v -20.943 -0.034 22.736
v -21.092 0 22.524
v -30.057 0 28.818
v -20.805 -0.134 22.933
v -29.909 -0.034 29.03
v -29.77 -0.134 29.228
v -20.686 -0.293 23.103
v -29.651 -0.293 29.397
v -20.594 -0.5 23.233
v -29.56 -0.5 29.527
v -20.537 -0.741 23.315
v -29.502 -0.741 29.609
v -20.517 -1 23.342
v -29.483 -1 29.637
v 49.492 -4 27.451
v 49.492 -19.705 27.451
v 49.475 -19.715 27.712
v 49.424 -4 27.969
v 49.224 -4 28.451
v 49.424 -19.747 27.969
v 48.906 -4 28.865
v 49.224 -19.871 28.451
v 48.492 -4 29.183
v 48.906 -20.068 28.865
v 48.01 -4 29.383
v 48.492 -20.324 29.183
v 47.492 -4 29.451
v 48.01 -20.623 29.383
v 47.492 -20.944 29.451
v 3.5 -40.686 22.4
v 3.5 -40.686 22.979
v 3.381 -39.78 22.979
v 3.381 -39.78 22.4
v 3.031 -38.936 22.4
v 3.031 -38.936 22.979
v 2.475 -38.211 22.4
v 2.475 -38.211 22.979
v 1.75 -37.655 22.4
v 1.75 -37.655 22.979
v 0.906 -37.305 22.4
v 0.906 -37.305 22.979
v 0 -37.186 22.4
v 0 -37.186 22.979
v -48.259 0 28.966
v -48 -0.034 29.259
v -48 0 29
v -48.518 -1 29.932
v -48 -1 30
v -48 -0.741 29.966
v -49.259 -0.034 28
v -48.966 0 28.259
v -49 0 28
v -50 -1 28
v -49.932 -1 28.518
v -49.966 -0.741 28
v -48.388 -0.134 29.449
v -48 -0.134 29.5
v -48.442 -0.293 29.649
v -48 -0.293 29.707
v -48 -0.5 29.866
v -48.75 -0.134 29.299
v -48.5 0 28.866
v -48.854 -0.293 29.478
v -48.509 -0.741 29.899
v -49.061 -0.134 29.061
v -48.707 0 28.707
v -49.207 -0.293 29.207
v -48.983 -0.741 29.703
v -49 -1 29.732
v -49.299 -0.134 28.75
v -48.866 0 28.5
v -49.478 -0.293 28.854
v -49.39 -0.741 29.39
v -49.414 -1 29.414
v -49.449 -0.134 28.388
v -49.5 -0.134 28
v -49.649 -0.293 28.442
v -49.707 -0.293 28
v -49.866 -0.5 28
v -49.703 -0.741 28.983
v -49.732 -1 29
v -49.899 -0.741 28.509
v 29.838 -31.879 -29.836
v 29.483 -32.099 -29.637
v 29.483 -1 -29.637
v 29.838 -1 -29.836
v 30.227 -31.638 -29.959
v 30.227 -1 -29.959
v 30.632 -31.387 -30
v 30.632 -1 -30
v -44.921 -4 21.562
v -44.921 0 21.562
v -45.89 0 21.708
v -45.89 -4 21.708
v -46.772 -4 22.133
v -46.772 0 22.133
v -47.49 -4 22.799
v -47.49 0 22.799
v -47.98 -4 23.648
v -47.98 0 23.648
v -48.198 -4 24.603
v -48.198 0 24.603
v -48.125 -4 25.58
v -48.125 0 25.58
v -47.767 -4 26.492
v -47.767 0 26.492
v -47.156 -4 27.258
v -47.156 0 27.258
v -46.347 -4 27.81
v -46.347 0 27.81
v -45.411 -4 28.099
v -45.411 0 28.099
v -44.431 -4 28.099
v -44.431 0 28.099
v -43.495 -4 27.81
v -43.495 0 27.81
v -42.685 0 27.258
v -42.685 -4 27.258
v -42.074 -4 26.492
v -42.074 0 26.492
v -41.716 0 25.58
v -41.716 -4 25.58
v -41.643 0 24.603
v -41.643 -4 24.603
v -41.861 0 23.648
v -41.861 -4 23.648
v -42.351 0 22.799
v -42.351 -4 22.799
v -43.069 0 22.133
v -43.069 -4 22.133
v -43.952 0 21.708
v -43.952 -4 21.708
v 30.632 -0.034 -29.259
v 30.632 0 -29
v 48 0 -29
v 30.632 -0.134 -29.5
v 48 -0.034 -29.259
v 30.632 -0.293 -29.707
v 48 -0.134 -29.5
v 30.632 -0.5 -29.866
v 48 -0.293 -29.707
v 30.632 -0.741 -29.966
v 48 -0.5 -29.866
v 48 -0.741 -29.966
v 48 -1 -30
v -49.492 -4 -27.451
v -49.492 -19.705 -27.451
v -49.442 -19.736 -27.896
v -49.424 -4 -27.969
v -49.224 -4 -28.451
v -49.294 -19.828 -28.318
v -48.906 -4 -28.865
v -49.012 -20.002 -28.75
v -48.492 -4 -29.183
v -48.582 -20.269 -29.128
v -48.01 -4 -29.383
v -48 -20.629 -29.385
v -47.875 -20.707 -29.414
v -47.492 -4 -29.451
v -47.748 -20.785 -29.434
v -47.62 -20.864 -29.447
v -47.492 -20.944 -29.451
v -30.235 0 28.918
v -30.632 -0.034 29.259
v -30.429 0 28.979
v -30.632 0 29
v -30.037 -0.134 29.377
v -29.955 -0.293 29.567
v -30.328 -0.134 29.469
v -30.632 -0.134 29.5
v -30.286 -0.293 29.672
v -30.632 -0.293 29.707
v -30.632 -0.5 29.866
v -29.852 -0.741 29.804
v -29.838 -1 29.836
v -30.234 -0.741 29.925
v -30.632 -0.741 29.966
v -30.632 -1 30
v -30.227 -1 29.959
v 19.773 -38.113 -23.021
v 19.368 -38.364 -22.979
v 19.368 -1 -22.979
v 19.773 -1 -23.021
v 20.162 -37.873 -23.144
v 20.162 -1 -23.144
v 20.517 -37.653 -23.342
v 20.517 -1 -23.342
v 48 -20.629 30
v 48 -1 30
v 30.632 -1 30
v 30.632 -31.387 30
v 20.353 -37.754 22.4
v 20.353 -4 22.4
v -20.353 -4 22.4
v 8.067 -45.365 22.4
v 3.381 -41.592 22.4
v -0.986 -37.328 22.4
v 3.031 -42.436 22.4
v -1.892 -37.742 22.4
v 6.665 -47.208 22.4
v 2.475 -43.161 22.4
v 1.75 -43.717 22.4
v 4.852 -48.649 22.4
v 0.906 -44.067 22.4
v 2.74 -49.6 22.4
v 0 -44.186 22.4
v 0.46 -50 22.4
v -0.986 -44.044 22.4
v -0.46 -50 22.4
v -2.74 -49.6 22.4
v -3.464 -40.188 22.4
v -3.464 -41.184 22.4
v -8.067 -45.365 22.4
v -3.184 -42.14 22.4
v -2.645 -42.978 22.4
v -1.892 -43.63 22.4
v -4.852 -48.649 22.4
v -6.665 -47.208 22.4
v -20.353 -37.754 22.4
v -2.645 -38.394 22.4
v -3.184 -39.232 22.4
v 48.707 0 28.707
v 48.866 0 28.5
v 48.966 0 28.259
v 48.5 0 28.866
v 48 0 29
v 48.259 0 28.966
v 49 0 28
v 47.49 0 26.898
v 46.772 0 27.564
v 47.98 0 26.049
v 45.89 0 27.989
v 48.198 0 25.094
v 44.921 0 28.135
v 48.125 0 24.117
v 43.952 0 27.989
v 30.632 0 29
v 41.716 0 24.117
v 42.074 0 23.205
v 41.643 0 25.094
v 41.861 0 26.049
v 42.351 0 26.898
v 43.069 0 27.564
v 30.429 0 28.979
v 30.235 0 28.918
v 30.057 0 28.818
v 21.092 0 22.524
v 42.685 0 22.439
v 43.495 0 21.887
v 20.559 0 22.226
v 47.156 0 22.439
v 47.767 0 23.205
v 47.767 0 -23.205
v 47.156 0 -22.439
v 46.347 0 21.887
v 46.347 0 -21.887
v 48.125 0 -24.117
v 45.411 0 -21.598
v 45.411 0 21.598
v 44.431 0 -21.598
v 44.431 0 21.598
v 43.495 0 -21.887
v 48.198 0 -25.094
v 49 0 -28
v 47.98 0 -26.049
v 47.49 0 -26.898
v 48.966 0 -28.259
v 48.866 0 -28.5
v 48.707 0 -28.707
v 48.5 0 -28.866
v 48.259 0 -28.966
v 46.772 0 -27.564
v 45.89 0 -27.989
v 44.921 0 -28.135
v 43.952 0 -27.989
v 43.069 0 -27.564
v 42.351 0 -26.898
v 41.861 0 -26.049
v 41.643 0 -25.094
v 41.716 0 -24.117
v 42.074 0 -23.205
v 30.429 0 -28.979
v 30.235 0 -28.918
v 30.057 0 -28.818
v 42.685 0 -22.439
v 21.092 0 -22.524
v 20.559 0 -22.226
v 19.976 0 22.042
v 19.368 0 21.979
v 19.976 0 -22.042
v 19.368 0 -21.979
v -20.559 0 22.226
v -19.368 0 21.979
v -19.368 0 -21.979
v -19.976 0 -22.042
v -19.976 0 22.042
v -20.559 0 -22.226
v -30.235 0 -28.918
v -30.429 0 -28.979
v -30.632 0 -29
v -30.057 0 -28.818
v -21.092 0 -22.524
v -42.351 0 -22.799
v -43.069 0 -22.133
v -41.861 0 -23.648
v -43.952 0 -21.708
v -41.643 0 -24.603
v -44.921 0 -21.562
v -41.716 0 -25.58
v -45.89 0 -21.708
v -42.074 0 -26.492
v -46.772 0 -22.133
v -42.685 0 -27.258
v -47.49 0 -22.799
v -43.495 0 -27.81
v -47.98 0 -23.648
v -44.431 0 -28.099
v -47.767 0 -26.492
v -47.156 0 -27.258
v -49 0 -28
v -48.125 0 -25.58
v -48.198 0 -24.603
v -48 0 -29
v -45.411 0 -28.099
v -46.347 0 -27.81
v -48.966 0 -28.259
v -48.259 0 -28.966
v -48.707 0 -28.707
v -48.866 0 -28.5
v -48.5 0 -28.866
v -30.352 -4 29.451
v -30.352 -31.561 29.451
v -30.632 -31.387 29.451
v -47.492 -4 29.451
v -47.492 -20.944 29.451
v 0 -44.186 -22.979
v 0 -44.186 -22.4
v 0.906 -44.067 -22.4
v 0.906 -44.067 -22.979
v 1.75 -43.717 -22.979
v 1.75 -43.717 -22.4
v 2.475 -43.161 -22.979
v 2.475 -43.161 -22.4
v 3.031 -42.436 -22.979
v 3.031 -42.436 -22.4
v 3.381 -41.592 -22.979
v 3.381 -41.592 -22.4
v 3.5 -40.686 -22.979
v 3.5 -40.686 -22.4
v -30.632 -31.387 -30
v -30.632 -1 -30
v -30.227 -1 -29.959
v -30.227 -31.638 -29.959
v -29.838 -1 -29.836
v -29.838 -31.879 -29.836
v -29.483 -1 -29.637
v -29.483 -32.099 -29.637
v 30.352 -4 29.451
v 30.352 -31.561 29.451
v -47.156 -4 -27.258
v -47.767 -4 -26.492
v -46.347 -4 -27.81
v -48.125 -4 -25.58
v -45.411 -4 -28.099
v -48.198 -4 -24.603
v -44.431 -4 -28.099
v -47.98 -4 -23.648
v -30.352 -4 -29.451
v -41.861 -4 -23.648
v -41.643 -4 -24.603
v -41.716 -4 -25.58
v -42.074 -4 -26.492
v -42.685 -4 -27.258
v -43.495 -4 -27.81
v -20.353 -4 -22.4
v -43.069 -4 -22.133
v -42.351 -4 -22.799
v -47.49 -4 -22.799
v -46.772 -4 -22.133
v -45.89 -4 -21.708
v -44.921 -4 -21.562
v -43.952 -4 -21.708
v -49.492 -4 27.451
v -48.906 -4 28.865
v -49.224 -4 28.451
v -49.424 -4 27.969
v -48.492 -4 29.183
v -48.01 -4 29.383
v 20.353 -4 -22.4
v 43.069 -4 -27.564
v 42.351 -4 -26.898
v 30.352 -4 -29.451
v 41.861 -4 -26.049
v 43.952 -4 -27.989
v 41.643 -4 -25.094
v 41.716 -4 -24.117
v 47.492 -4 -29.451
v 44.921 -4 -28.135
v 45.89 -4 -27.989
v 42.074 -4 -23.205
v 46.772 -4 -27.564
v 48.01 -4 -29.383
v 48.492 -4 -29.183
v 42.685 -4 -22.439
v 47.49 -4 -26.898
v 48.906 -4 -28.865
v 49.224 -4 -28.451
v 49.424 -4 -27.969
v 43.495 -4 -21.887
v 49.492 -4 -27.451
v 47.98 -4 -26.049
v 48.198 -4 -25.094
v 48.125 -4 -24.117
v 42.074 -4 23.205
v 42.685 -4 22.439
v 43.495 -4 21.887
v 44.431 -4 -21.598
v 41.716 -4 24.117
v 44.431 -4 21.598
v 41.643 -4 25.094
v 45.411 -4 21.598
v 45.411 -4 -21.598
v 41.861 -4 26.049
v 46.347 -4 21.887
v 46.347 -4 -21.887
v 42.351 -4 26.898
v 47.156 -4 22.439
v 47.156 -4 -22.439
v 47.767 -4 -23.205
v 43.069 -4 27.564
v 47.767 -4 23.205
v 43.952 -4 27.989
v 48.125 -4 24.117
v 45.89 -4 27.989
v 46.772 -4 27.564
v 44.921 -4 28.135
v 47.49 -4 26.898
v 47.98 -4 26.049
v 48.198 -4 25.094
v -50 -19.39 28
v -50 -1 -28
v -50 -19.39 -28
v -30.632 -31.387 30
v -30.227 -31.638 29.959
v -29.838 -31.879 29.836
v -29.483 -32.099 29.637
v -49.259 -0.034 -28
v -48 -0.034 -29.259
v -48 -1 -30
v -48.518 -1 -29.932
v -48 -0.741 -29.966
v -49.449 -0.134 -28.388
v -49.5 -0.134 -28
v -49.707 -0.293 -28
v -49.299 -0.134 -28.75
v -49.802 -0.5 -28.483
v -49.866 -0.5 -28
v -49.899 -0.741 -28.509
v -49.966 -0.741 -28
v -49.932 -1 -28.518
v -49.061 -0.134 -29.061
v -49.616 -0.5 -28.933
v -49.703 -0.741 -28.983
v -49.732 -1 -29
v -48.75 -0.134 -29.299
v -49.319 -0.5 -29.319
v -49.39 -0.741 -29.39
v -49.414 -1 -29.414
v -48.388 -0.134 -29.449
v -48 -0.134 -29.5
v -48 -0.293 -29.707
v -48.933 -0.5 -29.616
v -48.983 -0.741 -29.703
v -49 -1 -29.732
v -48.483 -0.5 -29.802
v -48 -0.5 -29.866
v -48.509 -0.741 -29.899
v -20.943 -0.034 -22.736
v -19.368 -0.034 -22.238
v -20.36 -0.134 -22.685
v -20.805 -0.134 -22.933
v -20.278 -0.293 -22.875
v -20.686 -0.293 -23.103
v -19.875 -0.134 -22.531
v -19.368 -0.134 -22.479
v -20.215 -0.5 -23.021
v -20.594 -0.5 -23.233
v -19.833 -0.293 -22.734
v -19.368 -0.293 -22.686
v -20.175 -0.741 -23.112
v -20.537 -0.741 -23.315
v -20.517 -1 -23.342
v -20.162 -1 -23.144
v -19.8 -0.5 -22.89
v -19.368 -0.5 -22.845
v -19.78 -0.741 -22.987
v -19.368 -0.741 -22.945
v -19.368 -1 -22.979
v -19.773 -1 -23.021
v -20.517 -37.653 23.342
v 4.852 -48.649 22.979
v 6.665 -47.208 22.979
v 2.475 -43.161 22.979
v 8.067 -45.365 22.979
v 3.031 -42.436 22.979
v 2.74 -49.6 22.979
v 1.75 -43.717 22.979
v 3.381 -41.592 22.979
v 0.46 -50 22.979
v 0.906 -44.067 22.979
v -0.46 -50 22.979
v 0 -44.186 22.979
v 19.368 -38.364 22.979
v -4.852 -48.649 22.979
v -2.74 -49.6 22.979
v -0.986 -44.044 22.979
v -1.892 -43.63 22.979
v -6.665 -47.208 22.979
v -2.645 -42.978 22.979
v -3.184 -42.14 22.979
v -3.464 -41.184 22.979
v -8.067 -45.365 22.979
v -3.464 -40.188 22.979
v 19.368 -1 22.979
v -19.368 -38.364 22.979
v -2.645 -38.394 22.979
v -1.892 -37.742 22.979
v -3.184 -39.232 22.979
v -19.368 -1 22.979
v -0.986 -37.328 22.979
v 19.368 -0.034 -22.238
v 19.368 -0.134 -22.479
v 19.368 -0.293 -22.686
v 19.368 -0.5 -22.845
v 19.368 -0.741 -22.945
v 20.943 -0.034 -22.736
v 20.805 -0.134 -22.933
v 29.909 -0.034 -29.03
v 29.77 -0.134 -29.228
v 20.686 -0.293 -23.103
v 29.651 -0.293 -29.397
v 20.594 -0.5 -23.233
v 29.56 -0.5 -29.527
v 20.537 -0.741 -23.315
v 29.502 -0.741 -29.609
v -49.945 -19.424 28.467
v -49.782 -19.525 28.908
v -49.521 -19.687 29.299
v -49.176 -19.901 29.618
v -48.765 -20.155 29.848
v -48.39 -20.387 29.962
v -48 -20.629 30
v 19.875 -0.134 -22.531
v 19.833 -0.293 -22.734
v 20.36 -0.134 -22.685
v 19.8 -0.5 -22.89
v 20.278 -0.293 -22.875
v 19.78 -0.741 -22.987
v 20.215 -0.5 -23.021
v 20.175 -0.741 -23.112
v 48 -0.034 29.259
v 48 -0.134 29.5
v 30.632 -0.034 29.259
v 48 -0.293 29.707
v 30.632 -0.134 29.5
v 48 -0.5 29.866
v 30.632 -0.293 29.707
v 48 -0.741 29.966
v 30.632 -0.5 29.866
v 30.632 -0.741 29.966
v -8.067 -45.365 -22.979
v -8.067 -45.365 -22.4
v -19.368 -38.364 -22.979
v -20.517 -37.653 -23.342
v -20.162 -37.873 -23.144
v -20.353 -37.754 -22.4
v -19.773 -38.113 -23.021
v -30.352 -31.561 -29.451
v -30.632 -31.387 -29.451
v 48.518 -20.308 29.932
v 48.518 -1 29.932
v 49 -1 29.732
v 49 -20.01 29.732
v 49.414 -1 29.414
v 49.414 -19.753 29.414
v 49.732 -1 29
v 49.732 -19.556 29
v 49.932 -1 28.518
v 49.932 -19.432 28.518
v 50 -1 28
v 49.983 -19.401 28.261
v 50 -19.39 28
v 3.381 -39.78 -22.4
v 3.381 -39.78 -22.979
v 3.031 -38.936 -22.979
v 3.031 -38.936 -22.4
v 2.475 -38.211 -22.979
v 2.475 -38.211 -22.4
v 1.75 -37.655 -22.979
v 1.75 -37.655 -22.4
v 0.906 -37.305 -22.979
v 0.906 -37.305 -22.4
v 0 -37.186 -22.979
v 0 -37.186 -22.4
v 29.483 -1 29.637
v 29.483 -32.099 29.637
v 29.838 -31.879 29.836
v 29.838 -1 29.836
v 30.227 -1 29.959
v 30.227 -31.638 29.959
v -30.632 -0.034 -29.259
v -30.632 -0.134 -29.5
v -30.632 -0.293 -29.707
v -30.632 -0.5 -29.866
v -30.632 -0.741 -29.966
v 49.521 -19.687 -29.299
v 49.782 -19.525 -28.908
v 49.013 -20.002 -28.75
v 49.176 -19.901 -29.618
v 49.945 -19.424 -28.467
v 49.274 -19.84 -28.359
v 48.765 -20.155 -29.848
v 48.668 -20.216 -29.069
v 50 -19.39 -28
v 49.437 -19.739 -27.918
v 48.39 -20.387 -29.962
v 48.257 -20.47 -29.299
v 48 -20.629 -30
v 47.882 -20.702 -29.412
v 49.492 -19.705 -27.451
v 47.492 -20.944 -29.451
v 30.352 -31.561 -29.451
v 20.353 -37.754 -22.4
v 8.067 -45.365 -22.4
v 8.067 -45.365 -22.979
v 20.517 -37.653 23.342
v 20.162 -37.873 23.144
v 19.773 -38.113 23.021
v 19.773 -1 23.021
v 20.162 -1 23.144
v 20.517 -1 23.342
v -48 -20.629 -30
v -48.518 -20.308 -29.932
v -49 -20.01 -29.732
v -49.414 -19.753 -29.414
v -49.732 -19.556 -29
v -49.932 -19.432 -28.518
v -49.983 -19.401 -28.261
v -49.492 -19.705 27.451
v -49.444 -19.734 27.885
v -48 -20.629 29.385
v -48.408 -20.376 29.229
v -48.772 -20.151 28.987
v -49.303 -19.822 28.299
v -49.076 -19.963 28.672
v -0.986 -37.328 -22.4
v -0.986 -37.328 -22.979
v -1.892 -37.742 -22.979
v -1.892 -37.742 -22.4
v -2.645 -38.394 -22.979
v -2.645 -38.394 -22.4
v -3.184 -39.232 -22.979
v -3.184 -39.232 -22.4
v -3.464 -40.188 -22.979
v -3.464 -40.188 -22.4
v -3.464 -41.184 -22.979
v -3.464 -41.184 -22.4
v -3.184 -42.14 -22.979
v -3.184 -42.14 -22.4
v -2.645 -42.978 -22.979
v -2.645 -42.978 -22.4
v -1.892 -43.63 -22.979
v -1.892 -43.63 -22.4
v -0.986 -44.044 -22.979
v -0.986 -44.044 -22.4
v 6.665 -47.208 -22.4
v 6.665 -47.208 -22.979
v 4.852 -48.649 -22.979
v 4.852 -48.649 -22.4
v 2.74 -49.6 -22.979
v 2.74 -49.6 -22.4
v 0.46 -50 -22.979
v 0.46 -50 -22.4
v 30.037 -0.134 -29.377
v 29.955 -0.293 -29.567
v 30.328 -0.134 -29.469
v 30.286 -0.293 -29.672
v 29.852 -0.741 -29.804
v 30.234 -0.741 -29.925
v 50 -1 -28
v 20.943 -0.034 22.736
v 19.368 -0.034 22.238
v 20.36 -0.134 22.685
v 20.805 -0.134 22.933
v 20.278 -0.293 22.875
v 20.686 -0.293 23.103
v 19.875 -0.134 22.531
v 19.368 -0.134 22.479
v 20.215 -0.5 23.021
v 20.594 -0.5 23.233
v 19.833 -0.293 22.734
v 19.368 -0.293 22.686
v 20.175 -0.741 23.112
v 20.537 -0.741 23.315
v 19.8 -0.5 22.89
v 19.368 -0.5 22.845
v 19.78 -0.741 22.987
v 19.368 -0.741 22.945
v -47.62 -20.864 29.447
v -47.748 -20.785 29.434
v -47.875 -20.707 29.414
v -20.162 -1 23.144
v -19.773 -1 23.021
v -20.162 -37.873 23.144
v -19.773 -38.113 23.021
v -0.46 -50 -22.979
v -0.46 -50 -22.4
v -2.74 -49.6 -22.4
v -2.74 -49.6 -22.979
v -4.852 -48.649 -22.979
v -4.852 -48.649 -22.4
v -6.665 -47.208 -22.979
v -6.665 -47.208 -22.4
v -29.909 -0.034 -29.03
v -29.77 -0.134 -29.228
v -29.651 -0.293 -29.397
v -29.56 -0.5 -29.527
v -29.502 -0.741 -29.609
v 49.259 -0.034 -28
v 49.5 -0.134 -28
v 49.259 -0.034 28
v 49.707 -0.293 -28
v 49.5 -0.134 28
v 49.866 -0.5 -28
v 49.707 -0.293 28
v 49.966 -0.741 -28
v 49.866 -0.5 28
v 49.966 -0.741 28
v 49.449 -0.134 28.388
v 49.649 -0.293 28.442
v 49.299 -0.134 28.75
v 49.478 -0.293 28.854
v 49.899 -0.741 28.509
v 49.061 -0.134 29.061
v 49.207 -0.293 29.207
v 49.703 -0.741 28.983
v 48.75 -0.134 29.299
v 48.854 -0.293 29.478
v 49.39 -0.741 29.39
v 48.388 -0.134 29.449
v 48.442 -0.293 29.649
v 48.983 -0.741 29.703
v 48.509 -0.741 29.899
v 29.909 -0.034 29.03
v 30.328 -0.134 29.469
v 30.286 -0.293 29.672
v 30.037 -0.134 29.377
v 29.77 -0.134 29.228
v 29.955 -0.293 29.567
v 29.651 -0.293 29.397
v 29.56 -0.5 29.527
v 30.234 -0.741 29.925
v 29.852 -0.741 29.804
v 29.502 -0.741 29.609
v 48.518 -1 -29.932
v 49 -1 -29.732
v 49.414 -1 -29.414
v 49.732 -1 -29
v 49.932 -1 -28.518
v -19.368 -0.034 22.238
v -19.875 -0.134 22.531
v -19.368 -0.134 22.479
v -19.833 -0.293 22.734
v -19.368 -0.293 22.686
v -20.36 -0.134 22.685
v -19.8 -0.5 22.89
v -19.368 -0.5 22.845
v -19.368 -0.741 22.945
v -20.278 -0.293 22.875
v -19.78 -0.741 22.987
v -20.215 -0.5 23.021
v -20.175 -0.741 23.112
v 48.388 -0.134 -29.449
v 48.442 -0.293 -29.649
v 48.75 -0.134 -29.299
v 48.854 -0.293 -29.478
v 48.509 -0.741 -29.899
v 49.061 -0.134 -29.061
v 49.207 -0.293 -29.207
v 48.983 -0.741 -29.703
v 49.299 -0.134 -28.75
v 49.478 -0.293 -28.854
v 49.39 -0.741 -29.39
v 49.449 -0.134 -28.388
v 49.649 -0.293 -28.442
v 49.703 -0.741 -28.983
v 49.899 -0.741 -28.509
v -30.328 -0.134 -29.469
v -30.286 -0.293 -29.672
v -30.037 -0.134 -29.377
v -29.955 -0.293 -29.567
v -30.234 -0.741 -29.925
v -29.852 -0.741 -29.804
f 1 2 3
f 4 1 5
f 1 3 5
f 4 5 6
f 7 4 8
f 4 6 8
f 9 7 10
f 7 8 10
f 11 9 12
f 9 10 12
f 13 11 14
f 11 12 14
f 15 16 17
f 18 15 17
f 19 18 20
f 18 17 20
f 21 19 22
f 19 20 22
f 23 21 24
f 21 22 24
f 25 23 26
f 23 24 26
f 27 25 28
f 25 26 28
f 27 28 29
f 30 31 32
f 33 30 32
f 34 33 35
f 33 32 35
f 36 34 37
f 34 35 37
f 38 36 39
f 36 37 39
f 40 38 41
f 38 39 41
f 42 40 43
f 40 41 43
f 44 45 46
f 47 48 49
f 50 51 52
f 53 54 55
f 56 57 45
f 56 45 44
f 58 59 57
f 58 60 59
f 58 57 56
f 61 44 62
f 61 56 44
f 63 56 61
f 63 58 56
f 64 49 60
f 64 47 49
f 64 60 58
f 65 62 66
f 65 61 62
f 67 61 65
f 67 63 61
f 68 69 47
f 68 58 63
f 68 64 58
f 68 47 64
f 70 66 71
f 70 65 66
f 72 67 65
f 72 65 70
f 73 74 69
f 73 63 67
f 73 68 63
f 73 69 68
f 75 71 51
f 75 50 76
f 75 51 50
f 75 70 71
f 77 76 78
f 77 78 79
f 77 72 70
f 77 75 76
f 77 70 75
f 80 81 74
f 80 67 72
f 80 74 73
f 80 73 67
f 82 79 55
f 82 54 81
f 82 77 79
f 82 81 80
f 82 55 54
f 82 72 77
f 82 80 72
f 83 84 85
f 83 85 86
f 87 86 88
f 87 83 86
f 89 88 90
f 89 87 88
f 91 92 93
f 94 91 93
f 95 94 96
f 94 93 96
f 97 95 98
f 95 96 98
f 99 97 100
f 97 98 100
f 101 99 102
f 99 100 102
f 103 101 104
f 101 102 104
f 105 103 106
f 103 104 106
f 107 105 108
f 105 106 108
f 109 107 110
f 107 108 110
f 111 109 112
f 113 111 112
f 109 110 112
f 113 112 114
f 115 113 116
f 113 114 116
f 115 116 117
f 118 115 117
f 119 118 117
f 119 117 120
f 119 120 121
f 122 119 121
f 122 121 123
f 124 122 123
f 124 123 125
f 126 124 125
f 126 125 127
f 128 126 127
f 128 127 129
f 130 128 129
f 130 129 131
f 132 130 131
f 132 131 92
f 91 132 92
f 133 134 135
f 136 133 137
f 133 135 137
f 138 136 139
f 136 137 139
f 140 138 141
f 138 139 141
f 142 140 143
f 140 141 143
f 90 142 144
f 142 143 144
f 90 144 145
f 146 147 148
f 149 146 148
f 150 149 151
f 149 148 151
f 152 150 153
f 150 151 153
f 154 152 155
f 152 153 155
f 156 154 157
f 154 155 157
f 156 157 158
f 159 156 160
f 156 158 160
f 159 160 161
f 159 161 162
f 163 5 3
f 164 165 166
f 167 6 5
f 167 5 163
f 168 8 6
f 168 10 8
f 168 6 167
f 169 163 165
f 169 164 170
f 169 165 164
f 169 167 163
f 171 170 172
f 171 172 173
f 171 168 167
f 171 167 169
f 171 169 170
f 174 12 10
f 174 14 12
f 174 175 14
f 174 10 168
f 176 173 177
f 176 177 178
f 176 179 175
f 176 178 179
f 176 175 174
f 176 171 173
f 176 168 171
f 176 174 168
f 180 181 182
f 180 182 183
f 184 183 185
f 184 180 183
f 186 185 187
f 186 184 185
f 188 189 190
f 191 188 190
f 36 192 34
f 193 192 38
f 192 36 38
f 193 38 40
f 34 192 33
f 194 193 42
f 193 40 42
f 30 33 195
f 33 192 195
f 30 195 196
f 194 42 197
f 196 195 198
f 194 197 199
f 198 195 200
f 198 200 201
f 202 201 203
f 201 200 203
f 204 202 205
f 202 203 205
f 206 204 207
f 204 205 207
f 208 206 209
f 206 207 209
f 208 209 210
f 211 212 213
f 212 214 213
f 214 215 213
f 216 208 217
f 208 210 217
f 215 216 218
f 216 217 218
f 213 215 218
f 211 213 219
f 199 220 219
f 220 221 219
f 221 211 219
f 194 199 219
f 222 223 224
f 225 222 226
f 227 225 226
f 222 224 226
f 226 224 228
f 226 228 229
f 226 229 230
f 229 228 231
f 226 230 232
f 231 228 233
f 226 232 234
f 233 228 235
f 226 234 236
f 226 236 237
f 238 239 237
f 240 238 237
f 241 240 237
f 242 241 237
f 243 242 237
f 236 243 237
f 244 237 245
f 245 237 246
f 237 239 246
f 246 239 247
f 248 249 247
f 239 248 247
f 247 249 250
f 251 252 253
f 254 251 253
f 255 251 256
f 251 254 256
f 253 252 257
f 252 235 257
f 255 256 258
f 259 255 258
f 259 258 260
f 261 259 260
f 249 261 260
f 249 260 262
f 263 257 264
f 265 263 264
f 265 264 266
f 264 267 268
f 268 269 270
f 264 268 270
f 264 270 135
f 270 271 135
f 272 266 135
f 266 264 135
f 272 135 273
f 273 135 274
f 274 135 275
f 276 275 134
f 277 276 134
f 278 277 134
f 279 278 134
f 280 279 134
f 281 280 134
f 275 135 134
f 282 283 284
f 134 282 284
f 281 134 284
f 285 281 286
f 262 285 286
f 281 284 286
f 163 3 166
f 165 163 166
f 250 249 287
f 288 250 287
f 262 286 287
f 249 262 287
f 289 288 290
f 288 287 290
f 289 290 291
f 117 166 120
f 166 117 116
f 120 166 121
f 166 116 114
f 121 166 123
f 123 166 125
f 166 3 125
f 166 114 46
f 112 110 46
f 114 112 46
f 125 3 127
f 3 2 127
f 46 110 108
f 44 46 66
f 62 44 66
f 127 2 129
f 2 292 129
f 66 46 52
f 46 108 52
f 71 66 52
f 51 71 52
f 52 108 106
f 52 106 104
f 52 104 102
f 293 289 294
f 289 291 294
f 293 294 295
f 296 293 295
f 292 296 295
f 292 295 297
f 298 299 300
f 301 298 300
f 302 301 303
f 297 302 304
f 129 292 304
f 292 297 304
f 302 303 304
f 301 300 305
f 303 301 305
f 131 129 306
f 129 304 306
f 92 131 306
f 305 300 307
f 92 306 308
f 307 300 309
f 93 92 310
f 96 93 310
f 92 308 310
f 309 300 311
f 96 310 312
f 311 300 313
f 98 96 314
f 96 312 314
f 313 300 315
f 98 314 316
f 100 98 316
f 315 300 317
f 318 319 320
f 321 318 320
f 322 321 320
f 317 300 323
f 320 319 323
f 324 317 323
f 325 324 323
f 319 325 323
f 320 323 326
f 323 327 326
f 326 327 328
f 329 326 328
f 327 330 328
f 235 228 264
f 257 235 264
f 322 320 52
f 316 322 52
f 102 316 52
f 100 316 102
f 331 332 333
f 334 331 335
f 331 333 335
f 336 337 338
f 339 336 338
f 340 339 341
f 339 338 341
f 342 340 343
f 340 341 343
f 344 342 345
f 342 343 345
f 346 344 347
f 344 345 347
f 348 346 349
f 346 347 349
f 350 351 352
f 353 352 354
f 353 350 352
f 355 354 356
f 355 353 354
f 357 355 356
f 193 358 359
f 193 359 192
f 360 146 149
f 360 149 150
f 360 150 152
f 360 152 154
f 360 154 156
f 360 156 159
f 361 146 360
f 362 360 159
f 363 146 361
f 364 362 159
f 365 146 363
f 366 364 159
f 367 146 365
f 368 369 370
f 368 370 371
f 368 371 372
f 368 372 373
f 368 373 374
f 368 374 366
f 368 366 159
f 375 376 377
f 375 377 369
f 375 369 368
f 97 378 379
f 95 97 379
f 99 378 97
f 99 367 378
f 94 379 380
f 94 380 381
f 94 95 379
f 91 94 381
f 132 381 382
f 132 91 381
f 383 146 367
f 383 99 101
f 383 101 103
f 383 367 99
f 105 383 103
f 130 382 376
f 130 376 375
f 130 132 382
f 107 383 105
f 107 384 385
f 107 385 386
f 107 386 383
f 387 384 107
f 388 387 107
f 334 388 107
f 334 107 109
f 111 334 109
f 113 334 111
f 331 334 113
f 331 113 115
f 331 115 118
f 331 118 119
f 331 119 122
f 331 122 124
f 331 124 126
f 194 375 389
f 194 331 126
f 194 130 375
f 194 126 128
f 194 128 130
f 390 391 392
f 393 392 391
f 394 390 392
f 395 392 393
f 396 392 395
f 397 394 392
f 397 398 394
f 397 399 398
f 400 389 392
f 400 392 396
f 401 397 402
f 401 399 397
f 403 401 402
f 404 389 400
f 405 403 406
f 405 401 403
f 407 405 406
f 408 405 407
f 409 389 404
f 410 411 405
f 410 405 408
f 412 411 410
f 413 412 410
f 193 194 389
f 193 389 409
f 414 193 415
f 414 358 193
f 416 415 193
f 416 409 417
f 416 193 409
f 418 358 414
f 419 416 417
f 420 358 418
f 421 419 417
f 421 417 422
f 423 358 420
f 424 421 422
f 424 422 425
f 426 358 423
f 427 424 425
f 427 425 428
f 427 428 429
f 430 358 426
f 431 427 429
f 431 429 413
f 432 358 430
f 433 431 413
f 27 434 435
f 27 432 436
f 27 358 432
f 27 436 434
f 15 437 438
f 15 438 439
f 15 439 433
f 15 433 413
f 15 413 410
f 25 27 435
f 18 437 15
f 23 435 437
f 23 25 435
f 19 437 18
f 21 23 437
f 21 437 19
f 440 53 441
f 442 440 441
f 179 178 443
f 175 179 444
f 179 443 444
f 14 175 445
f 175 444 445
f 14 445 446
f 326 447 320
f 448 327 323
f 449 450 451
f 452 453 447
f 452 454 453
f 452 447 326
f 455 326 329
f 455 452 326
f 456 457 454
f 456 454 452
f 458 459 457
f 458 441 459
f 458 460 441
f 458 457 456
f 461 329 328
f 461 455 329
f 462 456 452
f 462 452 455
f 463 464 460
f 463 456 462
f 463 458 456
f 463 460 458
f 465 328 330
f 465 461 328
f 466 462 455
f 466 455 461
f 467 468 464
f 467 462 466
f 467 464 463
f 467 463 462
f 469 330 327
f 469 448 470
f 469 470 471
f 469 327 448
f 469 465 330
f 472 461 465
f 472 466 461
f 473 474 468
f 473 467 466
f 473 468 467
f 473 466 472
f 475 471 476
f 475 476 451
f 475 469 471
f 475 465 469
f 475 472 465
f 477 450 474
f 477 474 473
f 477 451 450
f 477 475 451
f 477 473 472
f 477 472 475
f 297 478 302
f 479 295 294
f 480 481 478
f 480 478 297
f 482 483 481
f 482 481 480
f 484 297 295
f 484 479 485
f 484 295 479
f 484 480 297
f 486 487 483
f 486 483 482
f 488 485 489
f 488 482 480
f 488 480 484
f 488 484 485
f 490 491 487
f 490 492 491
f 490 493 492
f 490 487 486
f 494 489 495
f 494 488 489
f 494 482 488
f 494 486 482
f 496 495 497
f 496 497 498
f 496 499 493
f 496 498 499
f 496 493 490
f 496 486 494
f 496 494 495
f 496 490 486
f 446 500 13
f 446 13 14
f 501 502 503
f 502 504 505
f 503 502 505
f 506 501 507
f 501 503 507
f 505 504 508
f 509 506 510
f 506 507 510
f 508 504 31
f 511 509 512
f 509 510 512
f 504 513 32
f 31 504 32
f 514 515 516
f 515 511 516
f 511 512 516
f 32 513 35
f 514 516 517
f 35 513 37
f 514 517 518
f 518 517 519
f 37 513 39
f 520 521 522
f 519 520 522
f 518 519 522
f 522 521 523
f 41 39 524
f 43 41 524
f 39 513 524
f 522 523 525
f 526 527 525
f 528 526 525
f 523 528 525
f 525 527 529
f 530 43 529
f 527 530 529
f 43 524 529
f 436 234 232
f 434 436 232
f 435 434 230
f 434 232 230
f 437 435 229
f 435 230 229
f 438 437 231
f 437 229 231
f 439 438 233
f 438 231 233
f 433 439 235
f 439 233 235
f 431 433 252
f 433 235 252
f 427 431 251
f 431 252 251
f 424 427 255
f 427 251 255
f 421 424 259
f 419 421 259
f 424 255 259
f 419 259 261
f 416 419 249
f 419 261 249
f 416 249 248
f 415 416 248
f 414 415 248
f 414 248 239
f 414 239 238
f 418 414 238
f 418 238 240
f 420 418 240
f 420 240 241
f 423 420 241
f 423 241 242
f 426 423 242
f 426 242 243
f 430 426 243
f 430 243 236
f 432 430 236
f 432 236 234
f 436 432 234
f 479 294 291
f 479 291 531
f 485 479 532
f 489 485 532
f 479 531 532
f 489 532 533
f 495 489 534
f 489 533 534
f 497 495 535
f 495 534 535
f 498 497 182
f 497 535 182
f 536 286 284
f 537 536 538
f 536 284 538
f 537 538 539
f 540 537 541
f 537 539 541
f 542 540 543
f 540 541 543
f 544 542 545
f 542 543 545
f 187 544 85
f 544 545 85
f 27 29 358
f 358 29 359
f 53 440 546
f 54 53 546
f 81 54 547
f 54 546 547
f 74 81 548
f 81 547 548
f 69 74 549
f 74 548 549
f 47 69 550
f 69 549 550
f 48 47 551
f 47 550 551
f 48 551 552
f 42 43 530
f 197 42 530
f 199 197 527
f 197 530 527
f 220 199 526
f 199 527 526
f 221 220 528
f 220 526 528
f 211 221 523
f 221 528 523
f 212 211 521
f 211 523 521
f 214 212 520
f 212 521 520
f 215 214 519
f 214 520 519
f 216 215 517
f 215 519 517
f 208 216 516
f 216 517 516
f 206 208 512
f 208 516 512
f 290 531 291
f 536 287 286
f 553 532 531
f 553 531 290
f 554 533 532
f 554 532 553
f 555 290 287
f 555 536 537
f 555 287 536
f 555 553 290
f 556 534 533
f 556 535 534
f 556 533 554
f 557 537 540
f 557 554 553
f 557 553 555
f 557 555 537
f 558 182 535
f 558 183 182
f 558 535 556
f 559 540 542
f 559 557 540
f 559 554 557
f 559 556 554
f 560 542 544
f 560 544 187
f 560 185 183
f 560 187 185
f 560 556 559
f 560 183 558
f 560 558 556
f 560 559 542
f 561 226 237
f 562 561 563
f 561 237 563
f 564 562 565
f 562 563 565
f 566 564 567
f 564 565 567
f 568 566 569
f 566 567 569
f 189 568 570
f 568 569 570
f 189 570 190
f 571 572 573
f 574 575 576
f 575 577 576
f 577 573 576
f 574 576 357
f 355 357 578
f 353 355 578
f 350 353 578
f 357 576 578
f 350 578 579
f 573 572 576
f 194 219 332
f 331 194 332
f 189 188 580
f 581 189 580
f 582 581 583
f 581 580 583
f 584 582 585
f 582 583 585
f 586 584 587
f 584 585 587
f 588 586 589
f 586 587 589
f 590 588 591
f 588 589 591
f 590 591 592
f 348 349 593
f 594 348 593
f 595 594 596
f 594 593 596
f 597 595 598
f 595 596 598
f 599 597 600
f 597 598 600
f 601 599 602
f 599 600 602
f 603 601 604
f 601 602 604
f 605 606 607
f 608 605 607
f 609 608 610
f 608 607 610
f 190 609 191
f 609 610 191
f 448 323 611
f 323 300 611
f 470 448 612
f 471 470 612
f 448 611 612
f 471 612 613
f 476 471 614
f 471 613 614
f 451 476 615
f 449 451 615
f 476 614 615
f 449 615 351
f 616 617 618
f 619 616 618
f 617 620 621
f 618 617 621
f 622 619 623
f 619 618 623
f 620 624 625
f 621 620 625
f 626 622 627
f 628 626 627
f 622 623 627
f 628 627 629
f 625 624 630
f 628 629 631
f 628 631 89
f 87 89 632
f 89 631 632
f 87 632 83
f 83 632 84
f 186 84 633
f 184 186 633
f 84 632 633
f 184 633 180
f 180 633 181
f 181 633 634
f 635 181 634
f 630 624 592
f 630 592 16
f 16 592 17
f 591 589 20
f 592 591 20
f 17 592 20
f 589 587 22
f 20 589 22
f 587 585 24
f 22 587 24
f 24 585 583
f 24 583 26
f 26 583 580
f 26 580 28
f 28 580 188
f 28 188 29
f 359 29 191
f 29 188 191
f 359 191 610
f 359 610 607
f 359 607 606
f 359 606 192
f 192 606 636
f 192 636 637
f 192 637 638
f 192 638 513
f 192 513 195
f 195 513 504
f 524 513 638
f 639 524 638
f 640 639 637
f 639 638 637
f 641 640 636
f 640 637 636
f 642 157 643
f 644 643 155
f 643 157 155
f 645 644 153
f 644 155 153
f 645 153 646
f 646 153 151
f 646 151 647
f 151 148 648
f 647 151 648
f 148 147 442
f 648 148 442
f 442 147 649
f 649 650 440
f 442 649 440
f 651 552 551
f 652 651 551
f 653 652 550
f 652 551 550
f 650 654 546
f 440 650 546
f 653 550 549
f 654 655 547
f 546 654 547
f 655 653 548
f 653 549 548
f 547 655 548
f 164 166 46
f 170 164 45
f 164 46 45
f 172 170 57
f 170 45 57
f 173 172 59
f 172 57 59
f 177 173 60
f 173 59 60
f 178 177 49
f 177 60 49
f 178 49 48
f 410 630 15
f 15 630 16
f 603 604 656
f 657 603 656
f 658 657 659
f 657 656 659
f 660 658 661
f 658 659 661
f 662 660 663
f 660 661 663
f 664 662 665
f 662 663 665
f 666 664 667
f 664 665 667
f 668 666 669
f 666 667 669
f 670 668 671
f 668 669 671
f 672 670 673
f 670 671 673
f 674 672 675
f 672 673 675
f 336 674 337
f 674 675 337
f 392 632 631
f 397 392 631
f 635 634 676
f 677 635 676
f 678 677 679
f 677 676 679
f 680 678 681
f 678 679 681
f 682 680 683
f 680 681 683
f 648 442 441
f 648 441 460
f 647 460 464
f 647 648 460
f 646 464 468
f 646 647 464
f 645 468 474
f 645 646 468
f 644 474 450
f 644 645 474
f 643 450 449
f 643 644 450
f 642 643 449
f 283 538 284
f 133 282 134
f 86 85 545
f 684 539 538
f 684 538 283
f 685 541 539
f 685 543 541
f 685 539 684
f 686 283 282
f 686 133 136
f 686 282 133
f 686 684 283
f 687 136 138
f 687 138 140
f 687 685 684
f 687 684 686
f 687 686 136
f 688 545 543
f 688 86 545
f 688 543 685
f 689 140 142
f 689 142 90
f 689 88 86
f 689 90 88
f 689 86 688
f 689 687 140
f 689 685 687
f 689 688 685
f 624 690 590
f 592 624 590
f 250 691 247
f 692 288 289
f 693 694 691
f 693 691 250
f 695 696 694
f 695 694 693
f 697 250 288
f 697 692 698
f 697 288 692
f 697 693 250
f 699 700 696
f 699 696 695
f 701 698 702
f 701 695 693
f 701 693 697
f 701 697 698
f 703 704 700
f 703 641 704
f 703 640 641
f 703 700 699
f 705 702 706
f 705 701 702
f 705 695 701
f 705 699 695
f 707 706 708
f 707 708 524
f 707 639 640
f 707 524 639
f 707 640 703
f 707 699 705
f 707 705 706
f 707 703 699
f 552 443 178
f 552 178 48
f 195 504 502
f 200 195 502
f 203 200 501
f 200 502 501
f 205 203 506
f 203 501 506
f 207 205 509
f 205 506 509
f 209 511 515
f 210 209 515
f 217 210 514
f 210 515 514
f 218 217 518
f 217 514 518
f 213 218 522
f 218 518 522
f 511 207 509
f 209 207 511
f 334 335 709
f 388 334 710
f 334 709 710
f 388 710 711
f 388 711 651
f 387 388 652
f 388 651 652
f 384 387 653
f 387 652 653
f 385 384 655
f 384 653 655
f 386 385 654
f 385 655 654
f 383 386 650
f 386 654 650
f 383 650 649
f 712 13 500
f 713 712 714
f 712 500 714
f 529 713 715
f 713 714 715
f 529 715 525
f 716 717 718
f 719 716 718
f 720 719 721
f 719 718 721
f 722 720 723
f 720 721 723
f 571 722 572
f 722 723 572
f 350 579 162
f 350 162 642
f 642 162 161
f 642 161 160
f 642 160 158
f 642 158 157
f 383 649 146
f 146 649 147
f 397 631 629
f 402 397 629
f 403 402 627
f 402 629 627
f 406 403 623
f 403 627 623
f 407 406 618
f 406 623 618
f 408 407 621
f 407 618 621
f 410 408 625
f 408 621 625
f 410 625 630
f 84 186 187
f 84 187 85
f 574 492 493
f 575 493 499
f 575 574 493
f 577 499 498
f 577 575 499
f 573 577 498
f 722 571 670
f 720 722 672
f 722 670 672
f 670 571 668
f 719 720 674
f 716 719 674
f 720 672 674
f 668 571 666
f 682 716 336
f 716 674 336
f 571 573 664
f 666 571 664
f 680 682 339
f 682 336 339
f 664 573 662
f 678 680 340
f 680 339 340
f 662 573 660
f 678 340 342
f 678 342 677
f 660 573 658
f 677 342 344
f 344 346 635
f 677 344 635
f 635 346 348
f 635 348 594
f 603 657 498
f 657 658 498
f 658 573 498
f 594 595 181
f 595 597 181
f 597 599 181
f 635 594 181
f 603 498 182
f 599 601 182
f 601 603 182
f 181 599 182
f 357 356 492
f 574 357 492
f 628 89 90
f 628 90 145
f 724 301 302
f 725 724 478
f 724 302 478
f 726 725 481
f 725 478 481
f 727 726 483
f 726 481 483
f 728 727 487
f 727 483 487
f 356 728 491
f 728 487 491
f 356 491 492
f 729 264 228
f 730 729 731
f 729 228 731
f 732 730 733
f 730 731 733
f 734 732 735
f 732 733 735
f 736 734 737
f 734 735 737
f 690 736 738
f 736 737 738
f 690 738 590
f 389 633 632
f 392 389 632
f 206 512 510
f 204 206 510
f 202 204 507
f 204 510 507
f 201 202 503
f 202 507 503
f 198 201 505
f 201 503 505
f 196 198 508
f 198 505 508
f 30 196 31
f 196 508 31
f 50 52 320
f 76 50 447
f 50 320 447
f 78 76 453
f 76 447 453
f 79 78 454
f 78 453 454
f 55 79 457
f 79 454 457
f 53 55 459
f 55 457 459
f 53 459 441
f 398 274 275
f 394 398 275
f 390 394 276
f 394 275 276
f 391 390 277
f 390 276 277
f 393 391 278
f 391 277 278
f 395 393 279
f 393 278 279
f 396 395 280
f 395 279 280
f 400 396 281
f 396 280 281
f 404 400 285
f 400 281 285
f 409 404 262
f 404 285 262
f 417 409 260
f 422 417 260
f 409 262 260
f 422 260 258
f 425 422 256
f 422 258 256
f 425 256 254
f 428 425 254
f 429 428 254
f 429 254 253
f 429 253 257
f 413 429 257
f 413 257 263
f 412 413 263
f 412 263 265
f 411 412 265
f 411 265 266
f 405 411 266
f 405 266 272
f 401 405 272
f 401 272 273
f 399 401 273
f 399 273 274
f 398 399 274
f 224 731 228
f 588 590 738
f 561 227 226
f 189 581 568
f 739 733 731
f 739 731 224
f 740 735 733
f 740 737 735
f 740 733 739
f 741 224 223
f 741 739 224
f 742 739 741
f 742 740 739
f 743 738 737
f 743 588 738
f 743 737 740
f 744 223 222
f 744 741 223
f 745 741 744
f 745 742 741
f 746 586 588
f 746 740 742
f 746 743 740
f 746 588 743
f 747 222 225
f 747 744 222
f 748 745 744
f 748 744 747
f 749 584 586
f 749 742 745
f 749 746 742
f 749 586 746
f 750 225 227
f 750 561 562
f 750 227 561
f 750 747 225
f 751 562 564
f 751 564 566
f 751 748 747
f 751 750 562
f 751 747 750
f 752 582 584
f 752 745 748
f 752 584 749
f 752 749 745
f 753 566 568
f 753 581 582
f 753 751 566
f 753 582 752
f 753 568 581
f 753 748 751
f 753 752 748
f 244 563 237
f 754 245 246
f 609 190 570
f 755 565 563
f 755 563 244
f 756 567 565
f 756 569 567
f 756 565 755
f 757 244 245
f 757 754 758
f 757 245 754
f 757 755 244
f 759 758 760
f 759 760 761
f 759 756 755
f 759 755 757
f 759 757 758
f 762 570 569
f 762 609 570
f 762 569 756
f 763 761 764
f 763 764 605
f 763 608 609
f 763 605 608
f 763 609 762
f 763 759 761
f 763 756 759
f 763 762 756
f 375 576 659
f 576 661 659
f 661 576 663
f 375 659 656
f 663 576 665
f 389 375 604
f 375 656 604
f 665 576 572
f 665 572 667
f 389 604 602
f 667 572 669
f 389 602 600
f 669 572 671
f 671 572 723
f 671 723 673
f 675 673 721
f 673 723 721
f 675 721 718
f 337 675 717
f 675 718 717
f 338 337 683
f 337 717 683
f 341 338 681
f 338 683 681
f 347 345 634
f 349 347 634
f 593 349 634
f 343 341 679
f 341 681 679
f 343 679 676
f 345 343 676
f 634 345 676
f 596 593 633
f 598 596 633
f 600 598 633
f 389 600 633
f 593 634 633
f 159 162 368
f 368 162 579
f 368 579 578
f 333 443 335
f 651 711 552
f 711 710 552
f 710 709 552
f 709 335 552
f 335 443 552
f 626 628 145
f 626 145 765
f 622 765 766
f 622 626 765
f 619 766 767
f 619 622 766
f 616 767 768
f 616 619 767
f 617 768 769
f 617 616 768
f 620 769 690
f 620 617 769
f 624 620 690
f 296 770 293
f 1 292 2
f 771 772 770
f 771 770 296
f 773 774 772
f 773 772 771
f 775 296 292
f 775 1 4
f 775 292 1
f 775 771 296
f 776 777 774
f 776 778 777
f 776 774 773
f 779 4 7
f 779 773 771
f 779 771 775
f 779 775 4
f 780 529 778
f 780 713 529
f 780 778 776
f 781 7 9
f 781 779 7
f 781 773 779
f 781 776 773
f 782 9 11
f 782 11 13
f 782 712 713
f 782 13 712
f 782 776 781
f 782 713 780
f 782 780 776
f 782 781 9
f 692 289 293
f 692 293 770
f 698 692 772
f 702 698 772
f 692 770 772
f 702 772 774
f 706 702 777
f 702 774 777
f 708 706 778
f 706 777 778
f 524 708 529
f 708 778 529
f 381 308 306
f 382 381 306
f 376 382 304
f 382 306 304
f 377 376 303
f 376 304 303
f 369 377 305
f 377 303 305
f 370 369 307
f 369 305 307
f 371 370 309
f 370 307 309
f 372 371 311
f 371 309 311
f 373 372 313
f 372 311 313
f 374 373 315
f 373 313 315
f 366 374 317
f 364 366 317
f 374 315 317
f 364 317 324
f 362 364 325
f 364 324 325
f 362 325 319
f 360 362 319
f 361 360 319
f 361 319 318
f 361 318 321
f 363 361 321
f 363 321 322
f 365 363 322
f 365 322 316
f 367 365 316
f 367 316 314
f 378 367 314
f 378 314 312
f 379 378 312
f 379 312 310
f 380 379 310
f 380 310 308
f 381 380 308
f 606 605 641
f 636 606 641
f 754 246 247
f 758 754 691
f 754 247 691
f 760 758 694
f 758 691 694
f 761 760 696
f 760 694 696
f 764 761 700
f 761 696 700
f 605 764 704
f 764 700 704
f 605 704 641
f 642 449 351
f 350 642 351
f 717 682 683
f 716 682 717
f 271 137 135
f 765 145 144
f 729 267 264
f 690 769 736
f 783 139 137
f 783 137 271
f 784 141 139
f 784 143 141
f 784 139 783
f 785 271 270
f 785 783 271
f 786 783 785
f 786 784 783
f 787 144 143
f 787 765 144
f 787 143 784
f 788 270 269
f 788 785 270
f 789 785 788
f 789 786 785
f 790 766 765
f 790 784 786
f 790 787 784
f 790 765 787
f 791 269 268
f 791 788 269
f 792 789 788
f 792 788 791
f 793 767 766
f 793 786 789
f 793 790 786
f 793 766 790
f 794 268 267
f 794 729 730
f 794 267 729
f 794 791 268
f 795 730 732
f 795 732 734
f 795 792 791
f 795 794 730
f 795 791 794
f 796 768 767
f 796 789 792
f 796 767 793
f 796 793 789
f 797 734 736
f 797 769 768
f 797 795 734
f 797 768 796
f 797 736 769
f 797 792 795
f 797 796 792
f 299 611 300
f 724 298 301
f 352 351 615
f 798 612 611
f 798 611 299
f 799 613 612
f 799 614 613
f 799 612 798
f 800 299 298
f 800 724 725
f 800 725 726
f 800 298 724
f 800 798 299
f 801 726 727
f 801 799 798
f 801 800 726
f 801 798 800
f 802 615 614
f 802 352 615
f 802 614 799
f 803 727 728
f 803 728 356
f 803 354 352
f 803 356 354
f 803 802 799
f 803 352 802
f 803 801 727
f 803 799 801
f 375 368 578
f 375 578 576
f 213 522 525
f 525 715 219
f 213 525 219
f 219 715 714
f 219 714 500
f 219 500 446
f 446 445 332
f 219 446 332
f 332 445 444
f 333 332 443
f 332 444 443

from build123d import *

# Parameters (mm, degrees)
SKETCH1_R           = 3.286752884
BOSS_EXTRUDE2_DEPTH = 50
FILLET1_R           = 2
FILLET2_R           = 1
CUT_EXTRUDE1_DEPTH  = 70
SKETCH3_W           = 0.91909433
SKETCH3_H           = 44.79975758
CUT_EXTRUDE3_DEPTH  = 46


with BuildPart() as part:
    # Sketch1 → Boss-Extrude2 (new body)
    with BuildSketch(Plane(origin=(0, 0, 0), x_dir=(1, 0, 0), z_dir=(0, 1, 0))):
        Polygon((-50, -30), (-50, 30), (-30, 30), (-20, 22.979280262), (20, 22.979280262), (30, 30), (50, 30), (50, -30), (30, -30), (20, -22.979280262), (-20, -22.979280262), (-30, -30), align=None)
        with Locations(Location((-44.920732924, 24.848491151, 0), (0, 0, 270))):
            Circle(SKETCH1_R, mode=Mode.SUBTRACT)
        with Locations(Location((-44.920732924, -24.848491151, 0), (0, 0, 90))):
            Circle(SKETCH1_R, mode=Mode.SUBTRACT)
        with Locations(Location((44.920732924, -24.848491151, 0), (0, 0, 270))):
            Circle(SKETCH1_R, mode=Mode.SUBTRACT)
        with Locations(Location((44.920732924, 24.848491151, 0), (0, 0, 90))):
            Circle(SKETCH1_R, mode=Mode.SUBTRACT)
    extrude(amount=-BOSS_EXTRUDE2_DEPTH)

    # Fillet1
    fillet1_edges = [part.edges().sort_by_distance(p)[0] for p in [
        (-30, -25, -30),
        (-20, -25, -22.979280262),
        (20, -25, -22.979280262),
        (30, -25, -30),
        (50, -25, -30),
        (50, -25, 30),
        (30, -25, 30),
        (20, -25, 22.979280262),
        (-20, -25, 22.979280262),
        (-30, -25, 30),
        (-50, -25, 30),
        (-50, -25, -30),
    ]]
    fillet(fillet1_edges, radius=FILLET1_R)

    # Fillet2
    fillet2_edges = [part.edges().sort_by_distance(p)[0] for p in [
        (-39.315986035, 0, -30),
        (-50, 0, 0),
        (-39.315986035, 0, 30),
        (-25, 0, 26.489640131),
        (0, 0, 22.979280262),
        (25, 0, 26.489640131),
        (39.315986035, 0, 30),
        (50, 0, 0),
        (39.315986035, 0, -30),
        (25, 0, -26.489640131),
        (0, 0, -22.979280262),
        (-25, 0, -26.489640131),
        (-49.414213562, 0, 29.414213562),
        (-30.029368482, 0, 29.907057659),
        (30.029368482, 0, 29.907057659),
        (49.414213562, 0, 29.414213562),
        (49.414213562, 0, -29.414213562),
        (30.029368482, 0, -29.907057659),
        (-30.029368482, 0, -29.907057659),
        (-49.414213562, 0, -29.414213562),
        (-19.970631518, 0, -23.072222603),
        (19.970631518, 0, -23.072222603),
        (19.970631518, 0, 23.072222603),
        (-19.970631518, 0, 23.072222603),
    ]]
    fillet(fillet2_edges, radius=FILLET2_R)

    # Sketch2 → Cut-Extrude1 (cut)
    with BuildSketch(Plane.XY.offset(30)):
        Polygon((-48, -50), (-30.631972071, -50), (-30.631972071, -31.387227089), (-48, -20.62903259), align=None)
        with BuildLine():
            Line((-30.631972071, -50), (-0.459547165, -50))
            ThreePointArc((-0.459547165, -50), (-4.852357389, -48.649438504), (-8.06664868, -45.364757467))
            Line((-8.06664868, -45.364757467), (-30.631972071, -31.387227089))
            Line((-30.631972071, -31.387227089), (-30.631972071, -50))
        make_face()
        with BuildLine():
            ThreePointArc((8.06664868, -45.364757467), (4.852357389, -48.649438504), (0.459547165, -50))
            Line((0.459547165, -50), (50, -50))
            Line((50, -50), (50, -19.390182152))
            Line((50, -19.390182152), (8.06664868, -45.364757467))
        make_face()
        Polygon((-50, -50), (-48, -50), (-48, -20.62903259), (-50, -19.390182152), align=None)
        with BuildLine():
            ThreePointArc((3.5, -40.686020198), (2.474873734, -38.211146463), (0, -37.186020198))
            Line((0, -37.186020198), (0, -44.186020198))
            ThreePointArc((0, -44.186020198), (2.474873734, -43.160893932), (3.5, -40.686020198))
        make_face()
        with BuildLine():
            Line((0, -44.186020198), (0, -37.186020198))
            ThreePointArc((0, -37.186020198), (-3.5, -40.686020198), (0, -44.186020198))
        make_face()
    extrude(amount=-CUT_EXTRUDE1_DEPTH, mode=Mode.SUBTRACT)

    # Sketch3 → Cut-Extrude3 (cut)
    with BuildSketch(Plane.XZ.offset(50)):
        with BuildLine():
            Line((-0.459547165, -22.39987879), (-0.459547165, 22.39987879))
            Line((-0.459547165, 22.39987879), (-20.353496243, 22.39987879))
            Line((-20.353496243, 22.39987879), (-30.352042537, 29.450884636))
            Line((-30.352042537, 29.450884636), (-47.491946123, 29.450884636))
            ThreePointArc((-47.491946123, 29.450884636), (-48.906159685, 28.865098198), (-49.491946123, 27.450884636))
            Line((-49.491946123, 27.450884636), (-49.491946123, 0.606224364))
            Line((-49.491946123, 0.606224364), (-49.491946123, 0))
            Line((-49.491946123, 0), (-49.491946123, -0.606224364))
            Line((-49.491946123, -0.606224364), (-49.491946123, -27.450884636))
            ThreePointArc((-49.491946123, -27.450884636), (-48.906159685, -28.865098198), (-47.491946123, -29.450884636))
            Line((-47.491946123, -29.450884636), (-30.352042537, -29.450884636))
            Line((-30.352042537, -29.450884636), (-20.353496243, -22.39987879))
            Line((-20.353496243, -22.39987879), (-0.459547165, -22.39987879))
        make_face()
        Rectangle(SKETCH3_W, SKETCH3_H)
        with BuildLine():
            Line((47.491946123, 29.450884636), (30.352042537, 29.450884636))
            Line((30.352042537, 29.450884636), (20.353496243, 22.39987879))
            Line((20.353496243, 22.39987879), (0.459547165, 22.39987879))
            Line((0.459547165, 22.39987879), (0.459547165, -22.39987879))
            Line((0.459547165, -22.39987879), (20.353496243, -22.39987879))
            Line((20.353496243, -22.39987879), (30.352042537, -29.450884636))
            Line((30.352042537, -29.450884636), (47.491946123, -29.450884636))
            ThreePointArc((47.491946123, -29.450884636), (48.906159685, -28.865098198), (49.491946123, -27.450884636))
            Line((49.491946123, -27.450884636), (49.491946123, -0.606224364))
            Line((49.491946123, -0.606224364), (49.491946123, 0.606224364))
            Line((49.491946123, 0.606224364), (49.491946123, 27.450884636))
            ThreePointArc((49.491946123, 27.450884636), (48.906159685, 28.865098198), (47.491946123, 29.450884636))
        make_face()
    extrude(amount=-CUT_EXTRUDE3_DEPTH, mode=Mode.SUBTRACT)


solid = part.part
